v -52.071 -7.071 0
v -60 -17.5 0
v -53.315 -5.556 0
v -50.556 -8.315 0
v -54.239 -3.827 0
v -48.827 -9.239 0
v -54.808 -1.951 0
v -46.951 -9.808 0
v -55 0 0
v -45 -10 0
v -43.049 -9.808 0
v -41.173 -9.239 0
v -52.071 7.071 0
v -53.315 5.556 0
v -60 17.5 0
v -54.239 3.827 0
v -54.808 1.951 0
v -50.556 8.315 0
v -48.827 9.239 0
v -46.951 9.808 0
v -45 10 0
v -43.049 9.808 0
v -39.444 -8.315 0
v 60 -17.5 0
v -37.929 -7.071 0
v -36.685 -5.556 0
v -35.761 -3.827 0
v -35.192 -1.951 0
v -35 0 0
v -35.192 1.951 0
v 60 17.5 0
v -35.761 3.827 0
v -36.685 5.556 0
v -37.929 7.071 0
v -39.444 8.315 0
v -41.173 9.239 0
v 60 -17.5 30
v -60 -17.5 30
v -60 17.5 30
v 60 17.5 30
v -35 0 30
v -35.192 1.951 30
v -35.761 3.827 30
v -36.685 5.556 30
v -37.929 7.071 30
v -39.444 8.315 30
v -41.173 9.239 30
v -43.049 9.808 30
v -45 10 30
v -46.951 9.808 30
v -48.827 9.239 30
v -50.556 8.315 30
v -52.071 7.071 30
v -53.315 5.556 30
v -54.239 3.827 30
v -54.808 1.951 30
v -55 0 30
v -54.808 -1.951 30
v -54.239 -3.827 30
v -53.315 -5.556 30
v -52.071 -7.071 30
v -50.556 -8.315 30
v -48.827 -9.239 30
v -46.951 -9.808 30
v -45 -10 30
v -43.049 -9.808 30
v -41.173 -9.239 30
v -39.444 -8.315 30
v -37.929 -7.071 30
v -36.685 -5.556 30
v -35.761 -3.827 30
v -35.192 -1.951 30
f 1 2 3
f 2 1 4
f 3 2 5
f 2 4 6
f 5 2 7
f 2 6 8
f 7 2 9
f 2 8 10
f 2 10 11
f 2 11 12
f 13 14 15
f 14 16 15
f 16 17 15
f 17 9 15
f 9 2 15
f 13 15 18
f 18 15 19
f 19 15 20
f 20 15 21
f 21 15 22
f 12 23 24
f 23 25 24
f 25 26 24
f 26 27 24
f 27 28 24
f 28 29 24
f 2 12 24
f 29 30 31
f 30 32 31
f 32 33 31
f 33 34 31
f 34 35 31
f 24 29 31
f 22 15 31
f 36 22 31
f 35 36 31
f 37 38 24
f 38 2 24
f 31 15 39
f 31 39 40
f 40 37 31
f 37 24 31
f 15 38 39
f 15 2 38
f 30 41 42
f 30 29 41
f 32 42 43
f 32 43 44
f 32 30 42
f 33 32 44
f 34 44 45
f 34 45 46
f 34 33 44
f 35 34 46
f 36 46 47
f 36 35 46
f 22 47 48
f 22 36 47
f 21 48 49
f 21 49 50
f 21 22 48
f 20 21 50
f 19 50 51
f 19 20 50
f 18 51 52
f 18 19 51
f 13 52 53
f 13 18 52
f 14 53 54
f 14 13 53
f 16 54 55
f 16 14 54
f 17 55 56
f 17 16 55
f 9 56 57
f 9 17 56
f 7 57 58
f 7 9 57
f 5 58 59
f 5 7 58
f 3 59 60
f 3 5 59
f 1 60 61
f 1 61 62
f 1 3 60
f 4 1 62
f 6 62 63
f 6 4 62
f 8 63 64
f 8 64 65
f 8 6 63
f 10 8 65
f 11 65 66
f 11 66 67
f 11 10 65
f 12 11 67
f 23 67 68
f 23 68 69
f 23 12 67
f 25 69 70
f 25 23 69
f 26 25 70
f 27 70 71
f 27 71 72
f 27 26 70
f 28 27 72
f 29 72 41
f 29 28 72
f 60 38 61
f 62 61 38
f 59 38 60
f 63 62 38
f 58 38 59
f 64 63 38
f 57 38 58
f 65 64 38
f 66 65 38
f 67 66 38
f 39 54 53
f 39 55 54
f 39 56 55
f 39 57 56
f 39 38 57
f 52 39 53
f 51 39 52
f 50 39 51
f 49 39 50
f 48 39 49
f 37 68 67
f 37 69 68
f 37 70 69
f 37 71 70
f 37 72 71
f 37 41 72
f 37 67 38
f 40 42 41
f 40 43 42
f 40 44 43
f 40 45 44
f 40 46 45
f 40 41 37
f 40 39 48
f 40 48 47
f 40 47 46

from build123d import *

# Parameters (mm, degrees)
F0_W      = 120
F0_H      = 35
F0_R      = 10
F1_DEPTH  = 5
F1_FACE_W = 120
F1_FACE_H = 35
F1_FACE_R = 10
F2_DEPTH  = 25


with BuildPart() as f1:
    # F0 (on Top) → F1 (new body)
    with BuildSketch(Plane.XY):
        Rectangle(F0_W, F0_H)
        with Locations((-45, 0)):
            Circle(F0_R, mode=Mode.SUBTRACT)
    extrude(amount=F1_DEPTH)

    # F1_face (on face) → F2 (join)
    with BuildSketch(Plane(origin=(3.638123, 0, 5), x_dir=(1, 0, 0), z_dir=(0, 0, 1))):
        with Locations((-3.638123, 0)):
            Rectangle(F1_FACE_W, F1_FACE_H)
        with Locations((-48.638123, 0)):
            Circle(F1_FACE_R, mode=Mode.SUBTRACT)
    extrude(amount=F2_DEPTH)


solid = f1.part
